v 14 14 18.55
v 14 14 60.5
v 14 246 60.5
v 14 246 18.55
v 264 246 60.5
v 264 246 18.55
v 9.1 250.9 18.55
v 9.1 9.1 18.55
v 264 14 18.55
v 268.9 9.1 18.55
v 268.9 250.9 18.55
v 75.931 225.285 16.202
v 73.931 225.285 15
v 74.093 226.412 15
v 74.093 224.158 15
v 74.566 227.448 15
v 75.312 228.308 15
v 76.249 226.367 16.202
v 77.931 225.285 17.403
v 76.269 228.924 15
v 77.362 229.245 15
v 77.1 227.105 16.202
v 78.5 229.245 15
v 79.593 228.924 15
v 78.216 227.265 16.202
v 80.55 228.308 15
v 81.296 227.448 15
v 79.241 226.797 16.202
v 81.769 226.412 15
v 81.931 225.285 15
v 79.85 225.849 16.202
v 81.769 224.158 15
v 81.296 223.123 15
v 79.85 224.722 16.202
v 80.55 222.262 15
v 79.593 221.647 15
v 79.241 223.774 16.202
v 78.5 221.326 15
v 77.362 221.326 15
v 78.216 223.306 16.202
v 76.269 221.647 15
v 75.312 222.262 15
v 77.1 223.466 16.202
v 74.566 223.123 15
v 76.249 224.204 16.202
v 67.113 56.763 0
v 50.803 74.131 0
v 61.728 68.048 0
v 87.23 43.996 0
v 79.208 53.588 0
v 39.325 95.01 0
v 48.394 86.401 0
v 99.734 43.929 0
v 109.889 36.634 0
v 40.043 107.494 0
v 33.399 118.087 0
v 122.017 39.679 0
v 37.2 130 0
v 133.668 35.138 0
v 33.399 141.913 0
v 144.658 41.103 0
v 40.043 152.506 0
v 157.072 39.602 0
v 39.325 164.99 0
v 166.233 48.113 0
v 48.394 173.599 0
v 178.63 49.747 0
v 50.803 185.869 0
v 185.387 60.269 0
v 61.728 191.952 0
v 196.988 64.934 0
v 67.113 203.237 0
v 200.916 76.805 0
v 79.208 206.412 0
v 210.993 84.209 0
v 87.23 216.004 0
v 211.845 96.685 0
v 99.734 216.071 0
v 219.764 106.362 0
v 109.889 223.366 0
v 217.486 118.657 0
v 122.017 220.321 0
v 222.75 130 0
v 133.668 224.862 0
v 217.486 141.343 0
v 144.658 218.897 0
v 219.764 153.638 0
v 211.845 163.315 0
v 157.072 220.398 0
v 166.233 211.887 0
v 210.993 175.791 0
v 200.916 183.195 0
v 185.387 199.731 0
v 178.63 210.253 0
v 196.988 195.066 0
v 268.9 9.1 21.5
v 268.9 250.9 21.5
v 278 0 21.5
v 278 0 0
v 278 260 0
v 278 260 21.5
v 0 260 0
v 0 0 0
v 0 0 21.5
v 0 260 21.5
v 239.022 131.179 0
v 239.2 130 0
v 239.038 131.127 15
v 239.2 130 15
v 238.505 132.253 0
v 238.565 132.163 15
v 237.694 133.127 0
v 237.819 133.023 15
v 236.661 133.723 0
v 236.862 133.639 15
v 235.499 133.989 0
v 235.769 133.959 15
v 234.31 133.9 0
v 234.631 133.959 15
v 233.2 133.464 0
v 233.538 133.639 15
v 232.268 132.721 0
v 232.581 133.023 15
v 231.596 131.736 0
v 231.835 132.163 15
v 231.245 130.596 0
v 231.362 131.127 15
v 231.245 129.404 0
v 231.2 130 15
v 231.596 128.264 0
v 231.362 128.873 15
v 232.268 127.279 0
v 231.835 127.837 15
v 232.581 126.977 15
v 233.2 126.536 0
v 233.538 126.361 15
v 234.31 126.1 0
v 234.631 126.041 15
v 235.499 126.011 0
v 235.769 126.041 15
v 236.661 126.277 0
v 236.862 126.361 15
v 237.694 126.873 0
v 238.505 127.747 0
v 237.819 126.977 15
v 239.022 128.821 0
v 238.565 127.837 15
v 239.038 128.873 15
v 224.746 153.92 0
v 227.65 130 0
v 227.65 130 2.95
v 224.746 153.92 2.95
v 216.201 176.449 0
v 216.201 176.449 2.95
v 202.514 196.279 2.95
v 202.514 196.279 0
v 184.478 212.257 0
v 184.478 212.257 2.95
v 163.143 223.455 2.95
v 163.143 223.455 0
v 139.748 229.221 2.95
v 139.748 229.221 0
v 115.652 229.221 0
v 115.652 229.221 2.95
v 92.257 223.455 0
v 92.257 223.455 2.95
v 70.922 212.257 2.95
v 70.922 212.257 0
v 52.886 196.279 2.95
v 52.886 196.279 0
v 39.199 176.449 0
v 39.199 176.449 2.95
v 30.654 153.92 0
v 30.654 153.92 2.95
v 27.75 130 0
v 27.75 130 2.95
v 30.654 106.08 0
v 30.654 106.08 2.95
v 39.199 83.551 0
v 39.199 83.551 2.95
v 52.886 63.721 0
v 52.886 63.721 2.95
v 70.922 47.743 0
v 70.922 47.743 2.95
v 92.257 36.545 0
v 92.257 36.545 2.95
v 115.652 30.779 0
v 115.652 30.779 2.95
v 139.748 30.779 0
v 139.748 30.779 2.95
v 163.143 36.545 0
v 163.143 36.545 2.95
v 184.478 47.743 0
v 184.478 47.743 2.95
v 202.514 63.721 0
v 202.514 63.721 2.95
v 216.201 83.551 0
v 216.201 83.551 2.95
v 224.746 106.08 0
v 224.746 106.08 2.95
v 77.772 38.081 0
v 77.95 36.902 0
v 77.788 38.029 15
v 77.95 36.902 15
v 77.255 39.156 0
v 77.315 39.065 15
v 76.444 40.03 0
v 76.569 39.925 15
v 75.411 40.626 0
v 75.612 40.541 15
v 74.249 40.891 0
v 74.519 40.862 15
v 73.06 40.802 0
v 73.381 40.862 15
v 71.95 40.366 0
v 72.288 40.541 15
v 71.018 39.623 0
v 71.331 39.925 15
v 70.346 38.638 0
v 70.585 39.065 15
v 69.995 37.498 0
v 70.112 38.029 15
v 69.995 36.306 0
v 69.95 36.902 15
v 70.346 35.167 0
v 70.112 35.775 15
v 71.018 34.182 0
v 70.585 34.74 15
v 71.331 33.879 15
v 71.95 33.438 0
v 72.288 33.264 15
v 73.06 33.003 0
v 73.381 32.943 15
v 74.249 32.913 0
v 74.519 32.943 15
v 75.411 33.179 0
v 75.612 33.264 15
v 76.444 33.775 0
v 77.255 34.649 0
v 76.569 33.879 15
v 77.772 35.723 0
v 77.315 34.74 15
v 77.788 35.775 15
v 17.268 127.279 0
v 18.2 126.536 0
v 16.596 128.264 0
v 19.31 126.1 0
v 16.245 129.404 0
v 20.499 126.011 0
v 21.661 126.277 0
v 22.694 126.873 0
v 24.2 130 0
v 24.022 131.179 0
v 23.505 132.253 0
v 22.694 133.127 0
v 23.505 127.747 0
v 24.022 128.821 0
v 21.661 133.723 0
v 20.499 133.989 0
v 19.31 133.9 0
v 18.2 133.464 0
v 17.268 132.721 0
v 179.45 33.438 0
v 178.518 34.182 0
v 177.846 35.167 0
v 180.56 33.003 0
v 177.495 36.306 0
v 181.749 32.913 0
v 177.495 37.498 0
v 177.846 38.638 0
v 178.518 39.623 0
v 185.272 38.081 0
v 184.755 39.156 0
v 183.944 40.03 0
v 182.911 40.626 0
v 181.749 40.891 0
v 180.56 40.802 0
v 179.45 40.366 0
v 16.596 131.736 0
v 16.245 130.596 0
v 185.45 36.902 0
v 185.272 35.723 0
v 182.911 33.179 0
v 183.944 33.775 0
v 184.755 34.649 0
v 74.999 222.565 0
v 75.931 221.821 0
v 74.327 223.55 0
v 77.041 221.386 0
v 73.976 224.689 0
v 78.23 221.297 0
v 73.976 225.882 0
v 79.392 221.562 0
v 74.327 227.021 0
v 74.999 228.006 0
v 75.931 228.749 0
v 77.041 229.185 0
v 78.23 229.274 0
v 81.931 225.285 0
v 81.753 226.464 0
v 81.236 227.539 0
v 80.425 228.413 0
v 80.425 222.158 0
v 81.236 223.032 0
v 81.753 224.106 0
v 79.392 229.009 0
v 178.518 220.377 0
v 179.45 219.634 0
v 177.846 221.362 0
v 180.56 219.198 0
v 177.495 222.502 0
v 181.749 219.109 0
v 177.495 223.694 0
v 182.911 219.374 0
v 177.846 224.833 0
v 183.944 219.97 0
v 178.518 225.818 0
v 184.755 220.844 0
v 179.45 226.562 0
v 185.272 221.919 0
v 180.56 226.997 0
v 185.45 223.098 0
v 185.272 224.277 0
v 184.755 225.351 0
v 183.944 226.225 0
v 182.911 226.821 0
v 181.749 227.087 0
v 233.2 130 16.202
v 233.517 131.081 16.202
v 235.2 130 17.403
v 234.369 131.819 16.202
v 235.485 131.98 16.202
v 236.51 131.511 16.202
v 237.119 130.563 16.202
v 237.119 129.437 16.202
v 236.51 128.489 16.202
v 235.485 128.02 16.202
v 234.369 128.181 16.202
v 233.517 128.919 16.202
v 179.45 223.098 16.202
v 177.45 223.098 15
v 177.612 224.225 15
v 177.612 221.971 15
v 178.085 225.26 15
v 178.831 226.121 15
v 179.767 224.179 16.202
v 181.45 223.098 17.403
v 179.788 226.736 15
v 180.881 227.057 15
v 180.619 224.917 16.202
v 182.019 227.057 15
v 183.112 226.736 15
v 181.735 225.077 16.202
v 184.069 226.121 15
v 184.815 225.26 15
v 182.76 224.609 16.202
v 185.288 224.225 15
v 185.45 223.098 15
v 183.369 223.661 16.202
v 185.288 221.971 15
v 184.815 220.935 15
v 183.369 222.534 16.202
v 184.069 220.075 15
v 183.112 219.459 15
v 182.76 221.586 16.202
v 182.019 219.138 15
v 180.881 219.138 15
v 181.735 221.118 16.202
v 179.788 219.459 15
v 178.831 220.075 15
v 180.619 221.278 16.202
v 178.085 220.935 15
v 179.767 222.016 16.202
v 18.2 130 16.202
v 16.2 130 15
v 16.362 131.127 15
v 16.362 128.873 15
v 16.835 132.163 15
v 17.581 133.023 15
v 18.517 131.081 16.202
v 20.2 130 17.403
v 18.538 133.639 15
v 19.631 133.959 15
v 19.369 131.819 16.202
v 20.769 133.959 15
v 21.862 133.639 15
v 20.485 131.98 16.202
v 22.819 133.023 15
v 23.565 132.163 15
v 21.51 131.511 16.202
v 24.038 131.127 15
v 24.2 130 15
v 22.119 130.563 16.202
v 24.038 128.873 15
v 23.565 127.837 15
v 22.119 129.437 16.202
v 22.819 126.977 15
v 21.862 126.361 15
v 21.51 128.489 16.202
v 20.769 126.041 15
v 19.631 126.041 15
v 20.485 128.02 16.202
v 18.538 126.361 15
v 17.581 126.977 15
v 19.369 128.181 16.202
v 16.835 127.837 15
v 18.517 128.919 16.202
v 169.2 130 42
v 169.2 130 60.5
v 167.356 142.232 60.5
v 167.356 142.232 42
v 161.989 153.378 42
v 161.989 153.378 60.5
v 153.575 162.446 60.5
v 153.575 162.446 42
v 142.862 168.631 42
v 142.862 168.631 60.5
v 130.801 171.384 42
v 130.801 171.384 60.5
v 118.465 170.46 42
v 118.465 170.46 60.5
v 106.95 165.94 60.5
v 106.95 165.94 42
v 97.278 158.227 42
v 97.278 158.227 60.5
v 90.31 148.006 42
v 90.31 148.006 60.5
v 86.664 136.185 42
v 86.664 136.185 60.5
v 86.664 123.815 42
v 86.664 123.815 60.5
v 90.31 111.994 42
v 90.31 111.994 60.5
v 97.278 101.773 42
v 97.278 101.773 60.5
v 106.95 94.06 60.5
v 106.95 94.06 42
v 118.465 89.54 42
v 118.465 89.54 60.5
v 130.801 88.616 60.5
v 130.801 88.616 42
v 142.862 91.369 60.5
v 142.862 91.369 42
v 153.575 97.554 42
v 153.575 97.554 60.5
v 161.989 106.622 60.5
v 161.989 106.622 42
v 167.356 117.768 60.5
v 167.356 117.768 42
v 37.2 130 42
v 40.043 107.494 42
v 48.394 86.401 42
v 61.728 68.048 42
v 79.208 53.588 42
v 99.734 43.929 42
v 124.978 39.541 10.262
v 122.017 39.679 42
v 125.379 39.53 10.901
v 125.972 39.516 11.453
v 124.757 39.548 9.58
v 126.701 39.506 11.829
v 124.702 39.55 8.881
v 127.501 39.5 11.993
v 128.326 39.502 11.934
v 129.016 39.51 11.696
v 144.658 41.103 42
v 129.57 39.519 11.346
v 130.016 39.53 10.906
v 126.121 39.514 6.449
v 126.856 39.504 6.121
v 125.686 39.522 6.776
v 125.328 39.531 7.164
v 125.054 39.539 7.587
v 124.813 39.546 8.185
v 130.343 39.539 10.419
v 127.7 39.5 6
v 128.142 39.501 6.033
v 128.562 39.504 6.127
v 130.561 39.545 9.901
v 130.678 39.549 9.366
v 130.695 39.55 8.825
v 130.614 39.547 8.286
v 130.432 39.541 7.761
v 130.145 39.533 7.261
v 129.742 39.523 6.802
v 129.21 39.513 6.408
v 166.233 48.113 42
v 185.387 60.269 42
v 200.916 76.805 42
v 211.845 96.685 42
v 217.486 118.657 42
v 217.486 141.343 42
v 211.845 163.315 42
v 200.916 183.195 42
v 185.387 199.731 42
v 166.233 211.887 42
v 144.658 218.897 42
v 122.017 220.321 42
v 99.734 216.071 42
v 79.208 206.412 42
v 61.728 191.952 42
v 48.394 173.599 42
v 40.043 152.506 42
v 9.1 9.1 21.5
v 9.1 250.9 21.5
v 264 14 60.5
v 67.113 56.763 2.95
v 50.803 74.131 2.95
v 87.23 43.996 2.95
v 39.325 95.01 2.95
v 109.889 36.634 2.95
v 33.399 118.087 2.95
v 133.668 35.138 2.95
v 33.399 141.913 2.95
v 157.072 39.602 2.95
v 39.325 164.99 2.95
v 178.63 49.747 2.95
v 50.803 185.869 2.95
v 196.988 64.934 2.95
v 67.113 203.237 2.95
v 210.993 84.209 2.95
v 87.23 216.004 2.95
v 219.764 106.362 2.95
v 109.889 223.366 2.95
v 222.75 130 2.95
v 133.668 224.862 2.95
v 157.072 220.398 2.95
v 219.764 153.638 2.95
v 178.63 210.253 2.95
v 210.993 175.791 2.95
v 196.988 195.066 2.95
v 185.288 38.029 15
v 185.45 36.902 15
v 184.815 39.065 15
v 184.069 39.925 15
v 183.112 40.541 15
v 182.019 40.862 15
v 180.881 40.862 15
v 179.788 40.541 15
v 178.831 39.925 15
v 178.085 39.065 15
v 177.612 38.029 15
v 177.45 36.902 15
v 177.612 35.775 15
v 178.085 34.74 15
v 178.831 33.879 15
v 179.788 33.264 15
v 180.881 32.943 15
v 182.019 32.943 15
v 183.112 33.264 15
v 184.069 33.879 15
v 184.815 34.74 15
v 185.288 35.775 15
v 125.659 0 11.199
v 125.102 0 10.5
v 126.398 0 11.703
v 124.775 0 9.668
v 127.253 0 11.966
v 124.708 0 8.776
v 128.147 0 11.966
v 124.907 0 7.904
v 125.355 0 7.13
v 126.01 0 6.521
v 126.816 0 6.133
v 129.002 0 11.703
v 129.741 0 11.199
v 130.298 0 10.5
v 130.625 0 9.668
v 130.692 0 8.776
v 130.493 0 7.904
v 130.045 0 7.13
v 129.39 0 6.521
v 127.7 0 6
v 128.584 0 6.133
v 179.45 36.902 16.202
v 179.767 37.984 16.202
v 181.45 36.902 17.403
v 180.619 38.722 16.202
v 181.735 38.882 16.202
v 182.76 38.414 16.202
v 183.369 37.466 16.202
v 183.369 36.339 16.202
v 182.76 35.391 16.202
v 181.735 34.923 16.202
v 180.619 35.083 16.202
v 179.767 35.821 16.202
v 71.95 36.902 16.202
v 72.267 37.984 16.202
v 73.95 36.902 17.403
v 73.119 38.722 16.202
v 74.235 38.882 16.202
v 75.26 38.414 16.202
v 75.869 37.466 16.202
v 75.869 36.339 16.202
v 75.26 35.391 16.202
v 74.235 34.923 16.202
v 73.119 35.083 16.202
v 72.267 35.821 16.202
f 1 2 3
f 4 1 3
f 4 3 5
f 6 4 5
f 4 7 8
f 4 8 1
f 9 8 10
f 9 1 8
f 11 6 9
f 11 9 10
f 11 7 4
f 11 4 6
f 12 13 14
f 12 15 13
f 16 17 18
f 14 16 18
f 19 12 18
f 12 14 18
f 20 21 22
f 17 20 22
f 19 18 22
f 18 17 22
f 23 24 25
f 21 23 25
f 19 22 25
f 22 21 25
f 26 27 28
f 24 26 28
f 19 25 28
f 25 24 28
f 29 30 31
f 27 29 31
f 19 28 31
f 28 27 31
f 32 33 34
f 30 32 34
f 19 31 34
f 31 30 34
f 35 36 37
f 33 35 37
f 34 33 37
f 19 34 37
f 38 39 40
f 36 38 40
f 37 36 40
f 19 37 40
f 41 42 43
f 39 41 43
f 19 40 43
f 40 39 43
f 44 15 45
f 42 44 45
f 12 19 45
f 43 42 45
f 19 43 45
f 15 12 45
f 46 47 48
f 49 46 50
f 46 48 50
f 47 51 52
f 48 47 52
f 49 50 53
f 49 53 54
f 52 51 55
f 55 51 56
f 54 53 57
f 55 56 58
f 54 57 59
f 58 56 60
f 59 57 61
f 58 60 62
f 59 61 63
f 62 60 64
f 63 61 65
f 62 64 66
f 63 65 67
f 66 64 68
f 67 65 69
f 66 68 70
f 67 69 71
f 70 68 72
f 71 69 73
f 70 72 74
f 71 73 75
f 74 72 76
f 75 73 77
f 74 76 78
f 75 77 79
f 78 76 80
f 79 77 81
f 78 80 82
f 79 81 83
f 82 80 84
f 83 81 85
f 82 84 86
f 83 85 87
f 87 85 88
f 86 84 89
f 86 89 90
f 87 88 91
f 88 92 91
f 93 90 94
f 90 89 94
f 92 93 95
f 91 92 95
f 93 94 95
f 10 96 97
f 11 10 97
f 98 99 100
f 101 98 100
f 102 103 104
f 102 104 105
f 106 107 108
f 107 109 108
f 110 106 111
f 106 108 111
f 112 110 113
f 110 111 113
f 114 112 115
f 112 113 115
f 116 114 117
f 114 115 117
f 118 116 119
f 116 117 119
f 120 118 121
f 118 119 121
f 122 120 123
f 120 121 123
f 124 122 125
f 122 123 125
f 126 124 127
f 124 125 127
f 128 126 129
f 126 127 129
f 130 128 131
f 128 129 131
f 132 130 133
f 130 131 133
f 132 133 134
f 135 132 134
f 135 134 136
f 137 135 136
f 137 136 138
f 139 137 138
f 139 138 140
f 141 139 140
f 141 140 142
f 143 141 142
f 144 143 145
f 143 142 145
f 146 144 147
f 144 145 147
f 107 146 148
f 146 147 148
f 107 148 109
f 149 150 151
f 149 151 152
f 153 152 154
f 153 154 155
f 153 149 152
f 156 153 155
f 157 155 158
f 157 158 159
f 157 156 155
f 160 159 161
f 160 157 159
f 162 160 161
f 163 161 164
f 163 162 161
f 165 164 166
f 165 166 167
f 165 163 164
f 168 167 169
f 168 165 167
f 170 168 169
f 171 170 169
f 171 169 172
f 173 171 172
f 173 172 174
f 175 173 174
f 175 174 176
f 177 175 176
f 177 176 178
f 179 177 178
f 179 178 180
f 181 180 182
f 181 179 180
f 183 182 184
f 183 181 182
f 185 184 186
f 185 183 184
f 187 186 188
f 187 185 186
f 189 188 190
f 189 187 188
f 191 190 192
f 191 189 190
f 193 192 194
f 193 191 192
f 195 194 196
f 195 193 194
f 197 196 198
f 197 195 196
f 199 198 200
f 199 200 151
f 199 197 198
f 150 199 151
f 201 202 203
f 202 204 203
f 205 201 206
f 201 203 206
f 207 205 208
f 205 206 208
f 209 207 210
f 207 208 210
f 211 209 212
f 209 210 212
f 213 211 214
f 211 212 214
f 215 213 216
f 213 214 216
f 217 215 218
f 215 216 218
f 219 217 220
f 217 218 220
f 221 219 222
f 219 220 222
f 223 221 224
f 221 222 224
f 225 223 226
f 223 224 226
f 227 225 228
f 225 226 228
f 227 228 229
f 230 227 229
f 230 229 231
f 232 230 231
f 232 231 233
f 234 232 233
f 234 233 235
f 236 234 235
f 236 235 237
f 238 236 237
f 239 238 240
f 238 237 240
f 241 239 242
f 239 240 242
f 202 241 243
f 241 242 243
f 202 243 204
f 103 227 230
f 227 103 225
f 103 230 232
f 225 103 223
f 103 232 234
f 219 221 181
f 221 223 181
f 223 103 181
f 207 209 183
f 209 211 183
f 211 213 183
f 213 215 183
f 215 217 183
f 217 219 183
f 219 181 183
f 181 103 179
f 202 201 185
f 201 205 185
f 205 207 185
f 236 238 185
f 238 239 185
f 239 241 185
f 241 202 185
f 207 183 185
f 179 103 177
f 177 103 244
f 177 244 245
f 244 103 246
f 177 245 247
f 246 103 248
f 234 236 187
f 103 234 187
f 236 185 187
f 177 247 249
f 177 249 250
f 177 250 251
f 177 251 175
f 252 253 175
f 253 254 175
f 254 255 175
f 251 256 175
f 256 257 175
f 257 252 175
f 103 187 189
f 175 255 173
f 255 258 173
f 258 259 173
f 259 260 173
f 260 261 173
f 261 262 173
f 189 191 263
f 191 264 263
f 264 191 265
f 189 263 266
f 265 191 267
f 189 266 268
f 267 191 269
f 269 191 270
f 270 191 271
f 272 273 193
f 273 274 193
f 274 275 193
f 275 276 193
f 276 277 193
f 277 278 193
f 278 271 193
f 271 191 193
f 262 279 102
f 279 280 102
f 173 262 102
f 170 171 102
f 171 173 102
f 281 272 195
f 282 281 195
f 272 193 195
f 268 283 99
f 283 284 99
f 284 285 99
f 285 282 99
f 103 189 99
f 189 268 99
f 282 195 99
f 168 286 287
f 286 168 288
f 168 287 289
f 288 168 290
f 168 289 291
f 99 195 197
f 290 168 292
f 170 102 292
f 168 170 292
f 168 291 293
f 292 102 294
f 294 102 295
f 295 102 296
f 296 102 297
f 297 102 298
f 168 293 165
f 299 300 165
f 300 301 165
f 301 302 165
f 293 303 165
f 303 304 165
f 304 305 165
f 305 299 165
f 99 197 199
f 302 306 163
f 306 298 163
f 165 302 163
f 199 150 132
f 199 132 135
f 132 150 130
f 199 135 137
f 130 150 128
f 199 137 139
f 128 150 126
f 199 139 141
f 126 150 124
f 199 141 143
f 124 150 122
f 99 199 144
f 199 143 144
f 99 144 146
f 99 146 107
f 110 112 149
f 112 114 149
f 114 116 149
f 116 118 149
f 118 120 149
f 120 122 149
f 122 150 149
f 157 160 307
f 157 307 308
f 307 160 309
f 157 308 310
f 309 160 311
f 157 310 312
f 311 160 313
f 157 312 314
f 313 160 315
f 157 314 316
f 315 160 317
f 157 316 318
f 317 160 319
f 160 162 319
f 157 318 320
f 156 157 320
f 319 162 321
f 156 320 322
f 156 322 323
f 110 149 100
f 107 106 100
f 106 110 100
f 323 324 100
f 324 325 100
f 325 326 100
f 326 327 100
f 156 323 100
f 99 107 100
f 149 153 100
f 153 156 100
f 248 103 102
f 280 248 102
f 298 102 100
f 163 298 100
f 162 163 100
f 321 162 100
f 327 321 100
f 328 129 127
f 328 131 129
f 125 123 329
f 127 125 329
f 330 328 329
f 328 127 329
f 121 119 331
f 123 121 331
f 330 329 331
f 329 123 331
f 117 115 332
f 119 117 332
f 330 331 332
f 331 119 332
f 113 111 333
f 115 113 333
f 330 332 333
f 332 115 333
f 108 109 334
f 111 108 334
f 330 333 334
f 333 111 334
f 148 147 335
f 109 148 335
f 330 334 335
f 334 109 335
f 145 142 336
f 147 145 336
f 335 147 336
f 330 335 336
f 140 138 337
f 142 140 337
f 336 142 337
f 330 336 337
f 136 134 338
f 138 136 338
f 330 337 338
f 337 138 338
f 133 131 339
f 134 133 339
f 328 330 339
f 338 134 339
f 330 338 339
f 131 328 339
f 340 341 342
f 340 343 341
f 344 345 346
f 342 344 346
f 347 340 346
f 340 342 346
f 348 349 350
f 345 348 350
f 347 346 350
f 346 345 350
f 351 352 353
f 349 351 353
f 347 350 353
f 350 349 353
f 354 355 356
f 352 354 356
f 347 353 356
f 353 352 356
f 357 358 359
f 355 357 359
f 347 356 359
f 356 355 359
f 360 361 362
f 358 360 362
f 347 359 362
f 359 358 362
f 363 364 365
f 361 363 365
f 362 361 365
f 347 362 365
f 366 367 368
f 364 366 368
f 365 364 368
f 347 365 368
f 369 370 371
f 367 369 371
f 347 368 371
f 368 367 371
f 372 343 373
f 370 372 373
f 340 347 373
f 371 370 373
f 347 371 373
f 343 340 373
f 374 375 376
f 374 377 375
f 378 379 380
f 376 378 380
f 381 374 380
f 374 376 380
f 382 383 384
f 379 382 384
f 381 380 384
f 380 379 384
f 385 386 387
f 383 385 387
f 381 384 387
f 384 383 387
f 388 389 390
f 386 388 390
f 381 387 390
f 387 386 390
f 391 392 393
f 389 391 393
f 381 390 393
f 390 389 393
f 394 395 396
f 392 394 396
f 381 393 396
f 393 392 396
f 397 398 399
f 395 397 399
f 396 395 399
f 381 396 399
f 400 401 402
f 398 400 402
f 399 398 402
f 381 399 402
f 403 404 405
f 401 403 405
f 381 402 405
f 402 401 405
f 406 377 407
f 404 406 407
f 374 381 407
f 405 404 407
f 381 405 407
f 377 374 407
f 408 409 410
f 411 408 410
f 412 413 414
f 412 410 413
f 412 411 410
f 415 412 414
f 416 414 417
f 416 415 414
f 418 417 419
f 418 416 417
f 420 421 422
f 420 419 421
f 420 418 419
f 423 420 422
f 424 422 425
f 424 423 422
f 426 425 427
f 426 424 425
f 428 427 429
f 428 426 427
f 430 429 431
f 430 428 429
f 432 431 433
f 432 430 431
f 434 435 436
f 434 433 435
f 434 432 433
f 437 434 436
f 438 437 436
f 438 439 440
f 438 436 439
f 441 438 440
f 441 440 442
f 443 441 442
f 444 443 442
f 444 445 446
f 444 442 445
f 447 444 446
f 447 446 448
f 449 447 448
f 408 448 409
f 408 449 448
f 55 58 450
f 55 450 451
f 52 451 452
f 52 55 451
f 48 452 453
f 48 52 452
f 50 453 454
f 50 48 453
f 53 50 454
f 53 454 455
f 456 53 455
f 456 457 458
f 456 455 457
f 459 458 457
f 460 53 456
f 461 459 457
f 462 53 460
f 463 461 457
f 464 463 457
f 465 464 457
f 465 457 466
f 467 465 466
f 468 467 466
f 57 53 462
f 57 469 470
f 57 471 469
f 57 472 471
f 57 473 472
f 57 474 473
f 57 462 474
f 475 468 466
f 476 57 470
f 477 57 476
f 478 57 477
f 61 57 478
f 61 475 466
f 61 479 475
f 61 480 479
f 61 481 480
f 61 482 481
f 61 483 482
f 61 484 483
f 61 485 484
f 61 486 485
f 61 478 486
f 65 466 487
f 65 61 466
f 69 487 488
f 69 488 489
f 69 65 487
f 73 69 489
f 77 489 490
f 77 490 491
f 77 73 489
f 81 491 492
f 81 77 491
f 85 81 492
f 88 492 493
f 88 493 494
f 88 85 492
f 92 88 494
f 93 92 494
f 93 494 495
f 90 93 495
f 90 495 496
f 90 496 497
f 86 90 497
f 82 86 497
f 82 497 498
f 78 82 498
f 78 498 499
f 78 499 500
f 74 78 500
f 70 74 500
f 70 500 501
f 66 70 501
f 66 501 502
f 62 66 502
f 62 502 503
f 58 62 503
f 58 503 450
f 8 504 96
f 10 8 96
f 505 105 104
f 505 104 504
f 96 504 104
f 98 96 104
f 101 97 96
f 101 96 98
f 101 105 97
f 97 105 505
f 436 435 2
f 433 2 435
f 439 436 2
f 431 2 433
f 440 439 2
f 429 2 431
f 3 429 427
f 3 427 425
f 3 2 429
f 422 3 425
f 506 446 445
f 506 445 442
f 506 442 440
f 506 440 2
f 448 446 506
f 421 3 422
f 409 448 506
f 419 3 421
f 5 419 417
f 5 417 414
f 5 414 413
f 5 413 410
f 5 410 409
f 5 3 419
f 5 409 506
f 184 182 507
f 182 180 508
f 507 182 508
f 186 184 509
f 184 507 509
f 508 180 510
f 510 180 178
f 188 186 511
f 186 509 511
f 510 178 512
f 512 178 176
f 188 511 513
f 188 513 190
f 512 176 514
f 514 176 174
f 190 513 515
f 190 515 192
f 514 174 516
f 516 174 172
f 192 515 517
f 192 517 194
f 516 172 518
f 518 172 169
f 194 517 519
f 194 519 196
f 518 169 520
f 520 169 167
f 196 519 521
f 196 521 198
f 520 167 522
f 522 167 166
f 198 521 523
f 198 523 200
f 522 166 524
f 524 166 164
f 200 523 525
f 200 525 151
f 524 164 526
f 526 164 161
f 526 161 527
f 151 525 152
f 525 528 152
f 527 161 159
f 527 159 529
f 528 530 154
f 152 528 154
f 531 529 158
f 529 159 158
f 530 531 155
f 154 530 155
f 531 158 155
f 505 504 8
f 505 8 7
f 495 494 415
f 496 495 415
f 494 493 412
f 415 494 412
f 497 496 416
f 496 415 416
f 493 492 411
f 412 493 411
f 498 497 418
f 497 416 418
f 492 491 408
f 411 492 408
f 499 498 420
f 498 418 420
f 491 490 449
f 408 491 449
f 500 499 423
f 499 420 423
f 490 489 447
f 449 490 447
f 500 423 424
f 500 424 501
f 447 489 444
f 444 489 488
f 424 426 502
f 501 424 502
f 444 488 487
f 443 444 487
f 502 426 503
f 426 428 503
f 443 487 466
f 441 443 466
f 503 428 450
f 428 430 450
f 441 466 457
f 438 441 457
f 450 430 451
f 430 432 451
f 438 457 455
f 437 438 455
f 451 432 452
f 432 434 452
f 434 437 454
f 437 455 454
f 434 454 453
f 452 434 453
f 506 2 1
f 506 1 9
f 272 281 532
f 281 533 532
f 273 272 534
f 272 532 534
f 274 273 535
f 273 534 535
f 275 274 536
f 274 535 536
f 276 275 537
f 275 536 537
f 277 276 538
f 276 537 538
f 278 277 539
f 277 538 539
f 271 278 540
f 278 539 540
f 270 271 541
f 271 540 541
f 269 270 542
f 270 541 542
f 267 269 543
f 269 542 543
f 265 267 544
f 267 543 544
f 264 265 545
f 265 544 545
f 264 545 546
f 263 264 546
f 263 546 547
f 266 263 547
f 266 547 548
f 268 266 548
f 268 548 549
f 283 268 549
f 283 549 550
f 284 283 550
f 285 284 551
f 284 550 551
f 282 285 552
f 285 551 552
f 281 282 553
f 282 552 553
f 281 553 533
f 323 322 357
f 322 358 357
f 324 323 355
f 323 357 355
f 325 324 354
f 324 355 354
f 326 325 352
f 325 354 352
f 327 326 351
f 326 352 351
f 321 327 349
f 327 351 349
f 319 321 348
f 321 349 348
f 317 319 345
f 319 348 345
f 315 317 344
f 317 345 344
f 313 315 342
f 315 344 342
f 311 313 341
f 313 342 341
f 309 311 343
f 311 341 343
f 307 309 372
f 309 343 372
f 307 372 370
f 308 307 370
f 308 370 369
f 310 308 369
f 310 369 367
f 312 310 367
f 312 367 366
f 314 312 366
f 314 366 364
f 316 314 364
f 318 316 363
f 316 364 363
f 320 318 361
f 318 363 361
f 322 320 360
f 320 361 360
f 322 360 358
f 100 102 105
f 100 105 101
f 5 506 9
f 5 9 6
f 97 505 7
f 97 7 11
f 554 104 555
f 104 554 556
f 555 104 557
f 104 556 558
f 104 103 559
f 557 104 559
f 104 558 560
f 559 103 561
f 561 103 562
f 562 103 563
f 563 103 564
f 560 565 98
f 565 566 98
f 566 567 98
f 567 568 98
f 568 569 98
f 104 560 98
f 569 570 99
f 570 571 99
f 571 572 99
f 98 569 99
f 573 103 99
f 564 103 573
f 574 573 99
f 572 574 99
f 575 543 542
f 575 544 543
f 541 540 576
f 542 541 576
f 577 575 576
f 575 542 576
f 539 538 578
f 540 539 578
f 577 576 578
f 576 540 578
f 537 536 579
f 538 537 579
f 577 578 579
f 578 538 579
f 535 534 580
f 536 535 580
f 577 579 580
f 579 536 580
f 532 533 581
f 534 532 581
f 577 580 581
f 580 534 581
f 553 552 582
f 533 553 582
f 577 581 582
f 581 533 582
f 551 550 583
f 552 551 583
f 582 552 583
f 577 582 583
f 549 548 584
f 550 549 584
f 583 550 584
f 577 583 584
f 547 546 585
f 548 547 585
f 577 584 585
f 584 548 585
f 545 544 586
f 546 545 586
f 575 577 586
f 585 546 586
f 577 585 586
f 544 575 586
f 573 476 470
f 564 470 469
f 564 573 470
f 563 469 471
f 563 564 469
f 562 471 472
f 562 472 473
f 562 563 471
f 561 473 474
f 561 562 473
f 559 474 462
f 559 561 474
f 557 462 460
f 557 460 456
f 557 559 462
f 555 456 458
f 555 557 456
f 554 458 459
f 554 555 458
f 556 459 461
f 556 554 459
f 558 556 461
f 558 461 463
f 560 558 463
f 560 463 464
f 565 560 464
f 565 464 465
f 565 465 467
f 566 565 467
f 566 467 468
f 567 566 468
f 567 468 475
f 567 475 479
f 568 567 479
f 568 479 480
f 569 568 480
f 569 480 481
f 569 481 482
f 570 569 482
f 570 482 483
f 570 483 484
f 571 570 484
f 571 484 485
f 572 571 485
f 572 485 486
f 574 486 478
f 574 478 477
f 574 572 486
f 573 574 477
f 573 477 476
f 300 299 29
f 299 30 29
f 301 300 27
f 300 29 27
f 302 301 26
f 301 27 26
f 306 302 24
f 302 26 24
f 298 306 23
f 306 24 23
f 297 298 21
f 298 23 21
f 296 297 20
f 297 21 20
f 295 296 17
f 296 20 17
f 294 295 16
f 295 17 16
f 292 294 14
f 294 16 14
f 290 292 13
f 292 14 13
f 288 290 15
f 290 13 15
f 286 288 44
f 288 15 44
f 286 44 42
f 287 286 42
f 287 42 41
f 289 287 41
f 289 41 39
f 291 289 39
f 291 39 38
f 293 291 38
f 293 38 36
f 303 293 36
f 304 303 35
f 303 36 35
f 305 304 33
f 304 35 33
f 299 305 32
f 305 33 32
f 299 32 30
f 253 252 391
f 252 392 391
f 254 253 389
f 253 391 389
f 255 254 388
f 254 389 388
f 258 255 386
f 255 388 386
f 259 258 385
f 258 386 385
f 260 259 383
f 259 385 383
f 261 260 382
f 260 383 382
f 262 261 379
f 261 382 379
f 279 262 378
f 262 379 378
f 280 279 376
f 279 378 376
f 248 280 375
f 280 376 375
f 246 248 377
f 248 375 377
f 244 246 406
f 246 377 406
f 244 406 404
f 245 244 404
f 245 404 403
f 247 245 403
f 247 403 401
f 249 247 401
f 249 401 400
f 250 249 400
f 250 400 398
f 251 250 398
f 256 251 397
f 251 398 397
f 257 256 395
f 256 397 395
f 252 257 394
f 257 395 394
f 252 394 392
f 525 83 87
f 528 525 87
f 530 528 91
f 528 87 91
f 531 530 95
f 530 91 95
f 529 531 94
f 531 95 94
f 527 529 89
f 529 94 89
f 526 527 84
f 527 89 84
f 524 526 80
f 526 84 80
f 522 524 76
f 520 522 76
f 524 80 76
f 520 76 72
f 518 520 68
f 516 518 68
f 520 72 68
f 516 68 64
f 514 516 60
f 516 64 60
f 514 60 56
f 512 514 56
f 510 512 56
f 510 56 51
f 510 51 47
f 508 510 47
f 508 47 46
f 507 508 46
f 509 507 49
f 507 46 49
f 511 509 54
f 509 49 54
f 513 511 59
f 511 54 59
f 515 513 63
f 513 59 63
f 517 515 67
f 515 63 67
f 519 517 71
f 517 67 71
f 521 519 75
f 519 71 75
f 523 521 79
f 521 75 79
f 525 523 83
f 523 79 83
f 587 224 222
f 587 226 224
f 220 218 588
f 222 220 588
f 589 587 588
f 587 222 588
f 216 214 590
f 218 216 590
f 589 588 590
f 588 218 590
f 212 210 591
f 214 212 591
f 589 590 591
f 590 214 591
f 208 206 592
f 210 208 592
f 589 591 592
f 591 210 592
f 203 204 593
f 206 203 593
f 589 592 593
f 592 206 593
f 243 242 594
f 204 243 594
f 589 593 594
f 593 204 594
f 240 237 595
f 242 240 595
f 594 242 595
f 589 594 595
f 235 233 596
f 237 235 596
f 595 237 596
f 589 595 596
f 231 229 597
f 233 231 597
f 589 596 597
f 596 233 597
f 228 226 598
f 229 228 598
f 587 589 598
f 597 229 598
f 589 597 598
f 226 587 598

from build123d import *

# Parameters (mm, degrees)
SKETCH1_W                 = 278
SKETCH1_H                 = 260
BOSS_EXTRUDE1_DEPTH       = 60.5
SKETCH2_R                 = 90.5
CUT_EXTRUDE2_DEPTH        = 42
SKETCH3_R                 = 41.5
CUT_EXTRUDE3_DEPTH        = 386.414387381
SKETCH4_R                 = 99.95
SKETCH4_R_2               = 95.05
CUT_EXTRUDE5_DEPTH        = 2.95
SKETCH6_W                 = 278
SKETCH6_H                 = 260
SKETCH6_W_2               = 250
SKETCH6_H_2               = 232
CUT_EXTRUDE6_DEPTH        = 39
SKETCH7_W                 = 259.8
SKETCH7_H                 = 241.8
SKETCH7_W_2               = 250
SKETCH7_H_2               = 232
CUT_EXTRUDE7_DEPTH        = 41.95
F_8_0MM_DOWEL_HOLE1_D     = 8
F_8_0MM_DOWEL_HOLE1_DEPTH = 15
F_8_0MM_DOWEL_HOLE1_TIP   = 2.403442476
SKETCH10_R                = 3
CUT_EXTRUDE8_DEPTH        = 59


with BuildPart() as part:
    # Sketch1 → Boss-Extrude1 (new body)
    with BuildSketch(Plane.XY):
        with Locations((139, 130)):
            Rectangle(SKETCH1_W, SKETCH1_H)
    extrude(amount=BOSS_EXTRUDE1_DEPTH)

    # Sketch2 → Cut-Extrude2 (cut)
    with BuildSketch(Plane.XY):
        with Locations(Location((127.7, 130, 0), (0, 0, 180))):
            Circle(SKETCH2_R)
    extrude(amount=CUT_EXTRUDE2_DEPTH, mode=Mode.SUBTRACT)

    # Sketch3 → Cut-Extrude3 (cut, through all)
    with BuildSketch(Plane.XY):
        with Locations((127.7, 130)):
            Circle(SKETCH3_R)
    extrude(amount=CUT_EXTRUDE3_DEPTH, mode=Mode.SUBTRACT)

    # Sketch4 → Cut-Extrude5 (cut)
    with BuildSketch(Plane.XY):
        with Locations((127.7, 130)):
            Circle(SKETCH4_R)
        with Locations((127.7, 130)):
            Circle(SKETCH4_R_2, mode=Mode.SUBTRACT)
    extrude(amount=CUT_EXTRUDE5_DEPTH, mode=Mode.SUBTRACT)

    # Sketch6 → Cut-Extrude6 (cut)
    with BuildSketch(Plane.XY.offset(60.5)):
        with Locations((139, 130)):
            Rectangle(SKETCH6_W, SKETCH6_H)
        with Locations((139, 130)):
            Rectangle(SKETCH6_W_2, SKETCH6_H_2, mode=Mode.SUBTRACT)
    extrude(amount=-CUT_EXTRUDE6_DEPTH, mode=Mode.SUBTRACT)

    # Sketch7 → Cut-Extrude7 (cut)
    with BuildSketch(Plane.XY.offset(60.5)):
        with Locations((139, 130)):
            Rectangle(SKETCH7_W, SKETCH7_H)
        with Locations((139, 130)):
            Rectangle(SKETCH7_W_2, SKETCH7_H_2, mode=Mode.SUBTRACT)
    extrude(amount=-CUT_EXTRUDE7_DEPTH, mode=Mode.SUBTRACT)

    # Ø8.0mm Dowel Hole1
    with Locations(Plane(origin=(0, 0, 0), x_dir=(-1, 0, 0), z_dir=(0, 0, -1))):
        with Locations((-181.45, 223.097730907), (-77.93104653, 225.285367557), (-20.2, 130), (-73.95, 36.902269093), (-181.45, 36.902269093), (-235.2, 130)):
            Hole(F_8_0MM_DOWEL_HOLE1_D / 2, depth=F_8_0MM_DOWEL_HOLE1_DEPTH)
            with Locations((0, 0, -(F_8_0MM_DOWEL_HOLE1_DEPTH + F_8_0MM_DOWEL_HOLE1_TIP / 2))):  # 118° drill point
                Cone(0, F_8_0MM_DOWEL_HOLE1_D / 2, F_8_0MM_DOWEL_HOLE1_TIP, mode=Mode.SUBTRACT)

    # Sketch10 → Cut-Extrude8 (cut)
    with BuildSketch(Plane(origin=(0, 0, 0), x_dir=(1, 0, 0), z_dir=(0, 1, 0))):
        with Locations(Location((127.7, -9, 0), (0, 0, 90))):
            Circle(SKETCH10_R)
    extrude(amount=CUT_EXTRUDE8_DEPTH, mode=Mode.SUBTRACT)


solid = part.part
